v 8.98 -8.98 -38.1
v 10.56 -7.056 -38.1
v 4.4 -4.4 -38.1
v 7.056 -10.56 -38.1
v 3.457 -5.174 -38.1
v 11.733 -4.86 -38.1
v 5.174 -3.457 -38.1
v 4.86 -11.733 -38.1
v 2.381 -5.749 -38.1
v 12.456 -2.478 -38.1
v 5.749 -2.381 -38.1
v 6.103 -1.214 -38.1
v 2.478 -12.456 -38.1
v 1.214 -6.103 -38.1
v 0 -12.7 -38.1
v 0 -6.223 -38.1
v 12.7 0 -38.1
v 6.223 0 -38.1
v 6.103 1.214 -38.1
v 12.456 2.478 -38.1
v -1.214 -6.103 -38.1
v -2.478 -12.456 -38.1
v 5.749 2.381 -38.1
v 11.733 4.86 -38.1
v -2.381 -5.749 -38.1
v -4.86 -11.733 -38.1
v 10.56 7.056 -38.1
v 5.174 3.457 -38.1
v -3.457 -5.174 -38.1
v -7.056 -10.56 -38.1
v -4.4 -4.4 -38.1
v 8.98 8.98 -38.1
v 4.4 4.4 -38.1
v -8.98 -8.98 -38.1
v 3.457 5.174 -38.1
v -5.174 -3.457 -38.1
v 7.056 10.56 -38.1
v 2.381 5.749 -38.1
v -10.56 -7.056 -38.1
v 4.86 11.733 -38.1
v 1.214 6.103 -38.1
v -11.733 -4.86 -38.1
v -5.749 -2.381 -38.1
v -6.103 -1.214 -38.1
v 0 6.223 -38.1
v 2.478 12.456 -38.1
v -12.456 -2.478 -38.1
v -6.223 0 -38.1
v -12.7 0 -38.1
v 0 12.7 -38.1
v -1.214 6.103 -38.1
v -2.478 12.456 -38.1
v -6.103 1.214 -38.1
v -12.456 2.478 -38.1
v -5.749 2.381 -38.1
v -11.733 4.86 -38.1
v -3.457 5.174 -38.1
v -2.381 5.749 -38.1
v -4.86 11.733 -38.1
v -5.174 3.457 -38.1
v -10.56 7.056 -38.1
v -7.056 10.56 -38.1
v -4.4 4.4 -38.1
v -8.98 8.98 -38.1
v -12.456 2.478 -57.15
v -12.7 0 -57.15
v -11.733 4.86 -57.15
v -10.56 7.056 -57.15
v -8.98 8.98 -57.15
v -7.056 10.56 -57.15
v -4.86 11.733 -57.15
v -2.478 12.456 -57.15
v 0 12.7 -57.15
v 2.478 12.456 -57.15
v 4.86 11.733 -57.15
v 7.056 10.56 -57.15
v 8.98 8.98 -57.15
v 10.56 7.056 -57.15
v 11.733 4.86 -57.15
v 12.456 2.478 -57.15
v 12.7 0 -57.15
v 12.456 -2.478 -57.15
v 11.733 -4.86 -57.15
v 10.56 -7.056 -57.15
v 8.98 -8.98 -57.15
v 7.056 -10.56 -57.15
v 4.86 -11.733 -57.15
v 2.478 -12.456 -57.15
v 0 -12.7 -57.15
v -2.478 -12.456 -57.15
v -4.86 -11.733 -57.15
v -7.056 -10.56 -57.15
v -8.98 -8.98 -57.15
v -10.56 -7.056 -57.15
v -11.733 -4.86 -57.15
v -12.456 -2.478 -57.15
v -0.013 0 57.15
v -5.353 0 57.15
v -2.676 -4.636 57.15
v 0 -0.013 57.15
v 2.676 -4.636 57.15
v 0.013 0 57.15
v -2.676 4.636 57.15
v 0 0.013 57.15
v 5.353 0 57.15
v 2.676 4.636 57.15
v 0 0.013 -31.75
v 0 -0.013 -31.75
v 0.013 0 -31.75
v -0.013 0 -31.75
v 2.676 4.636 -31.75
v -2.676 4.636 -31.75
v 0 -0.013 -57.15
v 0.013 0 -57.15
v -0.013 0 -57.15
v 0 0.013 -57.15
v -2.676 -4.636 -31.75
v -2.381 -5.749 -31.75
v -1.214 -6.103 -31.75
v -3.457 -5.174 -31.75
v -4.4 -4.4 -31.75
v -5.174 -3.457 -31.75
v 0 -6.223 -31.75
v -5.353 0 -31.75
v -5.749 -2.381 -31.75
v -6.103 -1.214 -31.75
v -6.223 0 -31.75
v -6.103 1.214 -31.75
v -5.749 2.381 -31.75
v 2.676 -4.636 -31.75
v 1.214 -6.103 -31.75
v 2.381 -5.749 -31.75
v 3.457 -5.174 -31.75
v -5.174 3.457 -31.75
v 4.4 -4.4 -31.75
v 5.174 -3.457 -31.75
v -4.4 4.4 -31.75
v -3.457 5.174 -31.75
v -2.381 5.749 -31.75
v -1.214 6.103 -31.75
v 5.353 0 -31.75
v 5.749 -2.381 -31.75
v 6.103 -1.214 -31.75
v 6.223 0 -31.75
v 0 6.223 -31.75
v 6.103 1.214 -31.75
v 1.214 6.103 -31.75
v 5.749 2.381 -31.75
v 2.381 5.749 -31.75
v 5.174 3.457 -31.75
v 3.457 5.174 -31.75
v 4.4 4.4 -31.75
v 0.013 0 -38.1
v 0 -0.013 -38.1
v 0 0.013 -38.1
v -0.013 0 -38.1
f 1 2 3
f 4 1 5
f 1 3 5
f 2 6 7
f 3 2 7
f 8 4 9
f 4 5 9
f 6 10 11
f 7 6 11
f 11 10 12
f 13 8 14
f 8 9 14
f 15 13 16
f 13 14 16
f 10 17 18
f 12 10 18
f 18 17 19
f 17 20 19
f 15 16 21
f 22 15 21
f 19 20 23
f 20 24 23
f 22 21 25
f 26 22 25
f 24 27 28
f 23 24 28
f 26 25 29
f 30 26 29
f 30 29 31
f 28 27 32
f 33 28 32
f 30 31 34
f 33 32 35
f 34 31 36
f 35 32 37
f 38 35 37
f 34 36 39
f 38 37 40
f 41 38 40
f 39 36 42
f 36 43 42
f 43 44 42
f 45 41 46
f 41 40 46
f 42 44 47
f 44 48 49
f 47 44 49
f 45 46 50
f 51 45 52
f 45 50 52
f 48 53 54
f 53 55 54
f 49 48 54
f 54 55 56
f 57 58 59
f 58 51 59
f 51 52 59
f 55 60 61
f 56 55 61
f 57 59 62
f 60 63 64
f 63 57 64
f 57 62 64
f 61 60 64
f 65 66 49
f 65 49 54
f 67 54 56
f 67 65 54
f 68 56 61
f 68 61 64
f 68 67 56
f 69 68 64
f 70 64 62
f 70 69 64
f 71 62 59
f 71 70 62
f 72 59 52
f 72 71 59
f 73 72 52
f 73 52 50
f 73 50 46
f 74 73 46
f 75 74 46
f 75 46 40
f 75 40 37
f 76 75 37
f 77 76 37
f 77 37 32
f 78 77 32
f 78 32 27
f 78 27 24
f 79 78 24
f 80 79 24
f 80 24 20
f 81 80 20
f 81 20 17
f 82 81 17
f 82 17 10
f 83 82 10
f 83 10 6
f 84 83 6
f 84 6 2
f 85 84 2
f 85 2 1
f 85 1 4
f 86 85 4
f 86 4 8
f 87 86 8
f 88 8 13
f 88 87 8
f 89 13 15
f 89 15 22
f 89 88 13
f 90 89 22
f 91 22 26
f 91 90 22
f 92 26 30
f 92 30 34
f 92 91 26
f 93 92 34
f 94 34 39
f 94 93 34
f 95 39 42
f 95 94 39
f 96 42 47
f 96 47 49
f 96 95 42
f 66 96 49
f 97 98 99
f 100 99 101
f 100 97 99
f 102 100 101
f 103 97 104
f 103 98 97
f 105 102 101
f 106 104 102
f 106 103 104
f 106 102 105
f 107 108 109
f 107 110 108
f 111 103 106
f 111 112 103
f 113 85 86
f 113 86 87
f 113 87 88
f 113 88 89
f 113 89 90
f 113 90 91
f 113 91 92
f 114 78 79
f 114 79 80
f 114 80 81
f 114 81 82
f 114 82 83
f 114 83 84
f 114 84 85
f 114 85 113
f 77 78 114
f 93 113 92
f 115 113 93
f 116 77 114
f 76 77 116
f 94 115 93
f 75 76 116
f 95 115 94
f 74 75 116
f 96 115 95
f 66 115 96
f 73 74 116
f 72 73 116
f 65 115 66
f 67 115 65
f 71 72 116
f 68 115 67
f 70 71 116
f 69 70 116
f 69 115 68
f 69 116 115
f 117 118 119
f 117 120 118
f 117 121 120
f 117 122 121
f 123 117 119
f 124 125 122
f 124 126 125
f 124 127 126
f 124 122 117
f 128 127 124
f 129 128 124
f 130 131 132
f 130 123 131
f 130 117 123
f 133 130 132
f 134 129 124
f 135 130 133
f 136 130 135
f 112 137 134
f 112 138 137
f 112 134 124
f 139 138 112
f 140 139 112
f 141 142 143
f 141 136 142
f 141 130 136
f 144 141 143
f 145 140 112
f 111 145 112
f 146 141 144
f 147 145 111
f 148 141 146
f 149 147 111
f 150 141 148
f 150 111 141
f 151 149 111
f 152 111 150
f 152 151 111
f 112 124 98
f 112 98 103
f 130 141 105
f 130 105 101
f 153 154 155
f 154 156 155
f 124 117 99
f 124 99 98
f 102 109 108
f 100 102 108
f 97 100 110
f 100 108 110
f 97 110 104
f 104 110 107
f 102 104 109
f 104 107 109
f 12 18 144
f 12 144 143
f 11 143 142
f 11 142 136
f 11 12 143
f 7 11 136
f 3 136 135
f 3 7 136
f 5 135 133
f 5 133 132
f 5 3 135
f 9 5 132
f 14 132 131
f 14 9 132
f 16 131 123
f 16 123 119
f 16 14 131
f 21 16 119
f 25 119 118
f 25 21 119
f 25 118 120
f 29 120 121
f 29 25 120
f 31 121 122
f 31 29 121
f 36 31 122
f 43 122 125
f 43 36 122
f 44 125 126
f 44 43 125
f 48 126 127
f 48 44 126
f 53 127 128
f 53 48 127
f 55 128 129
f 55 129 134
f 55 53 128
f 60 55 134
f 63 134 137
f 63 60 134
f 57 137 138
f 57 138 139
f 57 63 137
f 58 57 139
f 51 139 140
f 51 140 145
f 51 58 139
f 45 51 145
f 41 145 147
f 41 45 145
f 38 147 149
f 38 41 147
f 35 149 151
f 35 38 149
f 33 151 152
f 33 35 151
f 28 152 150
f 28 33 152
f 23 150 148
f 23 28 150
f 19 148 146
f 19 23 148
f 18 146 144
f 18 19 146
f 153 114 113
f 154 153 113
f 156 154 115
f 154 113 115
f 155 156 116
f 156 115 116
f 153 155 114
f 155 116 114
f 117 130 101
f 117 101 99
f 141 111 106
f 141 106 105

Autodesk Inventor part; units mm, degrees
ref_plane "YZ Plane" through (0, 0, 0) normal (1, 0, 0) x (0, 1, 0)
ref_plane "XZ Plane" through (0, 0, 0) normal (0, 1, 0) x (-1, 0, 0)
ref_plane "XY Plane" through (0, 0, 0) normal (0, 0, 1) x (1, 0, 0)
sketch "Sketch1" plane through (0, 0, 0) normal (0, 0, 1) x (1, 0, 0)
  line L0 (5.4993, 0) -> (2.7496, -4.7625)
  line L1 (2.7496, -4.7625) -> (-2.7496, -4.7625)
  line L2 (-2.7496, -4.7625) -> (-5.4993, 0)
  line L3 (-5.4993, 0) -> (-2.7496, 4.7625)
  line L4 (-2.7496, 4.7625) -> (2.7496, 4.7625)
  line L5 (2.7496, 4.7625) -> (5.4993, 0)
  circle A0 centre (0, 0) radius 0.0127
  dimension "d0" = 9.525
  dimension "d6" = 0.0254
extrude "Extrusion2" add sketch "Sketch1" along normal mid plane 114.3
sketch "Sketch4" plane through (0, 0, -57.15) normal (0, 0, -1) x (-1, 0, 0)
  circle A0 centre (0, 0) radius 0.0127 projected
  circle A1 centre (0, 0) radius 12.7
  dimension "d10" = 25.4
extrude "Extrusion4" add sketch "Sketch4" against normal blind 19.05
thicken "Reduce Hex Shaft" operation add thickness 0.127 both sides no extend neighbours yes toward (0, -1, 0) faces at (0.9165, 4.7625, -6.35) (4.5827, 1.5875, -6.35) (3.6662, -3.175, -6.35) (-3.6662, 3.175, -6.35) (-4.5827, -1.5875, -6.35) (-0.9165, -4.7625, -6.35)
sketch "Sketch5" plane through (0, 0, -38.1) normal (0, 0, 1) x (1, 0, 0)
  circle A0 centre (0, 0) radius 6.35
  dimension "d15" = 12.7
extrude "Extrusion5" add sketch "Sketch5" along normal blind 6.35
thicken "Reduce Base Bushing" operation add thickness 0.127 both sides no extend neighbours yes toward (-0.9967573, 0.0804666, 0) faces at (6.3294, -0.511, -33.8667)
equation "\"d0\" = hexSize"
equation "\"d4\" = length"
equation "\"d13\" = printOffset"
equation "\"d14\" = printOffset"
equation "\"d15\" = bushingForBaseHole"
equation "\"d16\" = sideOfBase"
equation "\"d20\" = printOffset"
equation "\"d21\" = printOffset"
equation "\"hexSize\" = 9.525"
equation "\"length\" = 114.3"
equation "\"printOffset\" = 0.127"
equation "\"bushingForBaseHole\" = 12.7"
equation "\"sideOfBase\" = 6.35"
properties part number "3_8x4_5-inchHexShaft" material "PC/ABS Plastic"
